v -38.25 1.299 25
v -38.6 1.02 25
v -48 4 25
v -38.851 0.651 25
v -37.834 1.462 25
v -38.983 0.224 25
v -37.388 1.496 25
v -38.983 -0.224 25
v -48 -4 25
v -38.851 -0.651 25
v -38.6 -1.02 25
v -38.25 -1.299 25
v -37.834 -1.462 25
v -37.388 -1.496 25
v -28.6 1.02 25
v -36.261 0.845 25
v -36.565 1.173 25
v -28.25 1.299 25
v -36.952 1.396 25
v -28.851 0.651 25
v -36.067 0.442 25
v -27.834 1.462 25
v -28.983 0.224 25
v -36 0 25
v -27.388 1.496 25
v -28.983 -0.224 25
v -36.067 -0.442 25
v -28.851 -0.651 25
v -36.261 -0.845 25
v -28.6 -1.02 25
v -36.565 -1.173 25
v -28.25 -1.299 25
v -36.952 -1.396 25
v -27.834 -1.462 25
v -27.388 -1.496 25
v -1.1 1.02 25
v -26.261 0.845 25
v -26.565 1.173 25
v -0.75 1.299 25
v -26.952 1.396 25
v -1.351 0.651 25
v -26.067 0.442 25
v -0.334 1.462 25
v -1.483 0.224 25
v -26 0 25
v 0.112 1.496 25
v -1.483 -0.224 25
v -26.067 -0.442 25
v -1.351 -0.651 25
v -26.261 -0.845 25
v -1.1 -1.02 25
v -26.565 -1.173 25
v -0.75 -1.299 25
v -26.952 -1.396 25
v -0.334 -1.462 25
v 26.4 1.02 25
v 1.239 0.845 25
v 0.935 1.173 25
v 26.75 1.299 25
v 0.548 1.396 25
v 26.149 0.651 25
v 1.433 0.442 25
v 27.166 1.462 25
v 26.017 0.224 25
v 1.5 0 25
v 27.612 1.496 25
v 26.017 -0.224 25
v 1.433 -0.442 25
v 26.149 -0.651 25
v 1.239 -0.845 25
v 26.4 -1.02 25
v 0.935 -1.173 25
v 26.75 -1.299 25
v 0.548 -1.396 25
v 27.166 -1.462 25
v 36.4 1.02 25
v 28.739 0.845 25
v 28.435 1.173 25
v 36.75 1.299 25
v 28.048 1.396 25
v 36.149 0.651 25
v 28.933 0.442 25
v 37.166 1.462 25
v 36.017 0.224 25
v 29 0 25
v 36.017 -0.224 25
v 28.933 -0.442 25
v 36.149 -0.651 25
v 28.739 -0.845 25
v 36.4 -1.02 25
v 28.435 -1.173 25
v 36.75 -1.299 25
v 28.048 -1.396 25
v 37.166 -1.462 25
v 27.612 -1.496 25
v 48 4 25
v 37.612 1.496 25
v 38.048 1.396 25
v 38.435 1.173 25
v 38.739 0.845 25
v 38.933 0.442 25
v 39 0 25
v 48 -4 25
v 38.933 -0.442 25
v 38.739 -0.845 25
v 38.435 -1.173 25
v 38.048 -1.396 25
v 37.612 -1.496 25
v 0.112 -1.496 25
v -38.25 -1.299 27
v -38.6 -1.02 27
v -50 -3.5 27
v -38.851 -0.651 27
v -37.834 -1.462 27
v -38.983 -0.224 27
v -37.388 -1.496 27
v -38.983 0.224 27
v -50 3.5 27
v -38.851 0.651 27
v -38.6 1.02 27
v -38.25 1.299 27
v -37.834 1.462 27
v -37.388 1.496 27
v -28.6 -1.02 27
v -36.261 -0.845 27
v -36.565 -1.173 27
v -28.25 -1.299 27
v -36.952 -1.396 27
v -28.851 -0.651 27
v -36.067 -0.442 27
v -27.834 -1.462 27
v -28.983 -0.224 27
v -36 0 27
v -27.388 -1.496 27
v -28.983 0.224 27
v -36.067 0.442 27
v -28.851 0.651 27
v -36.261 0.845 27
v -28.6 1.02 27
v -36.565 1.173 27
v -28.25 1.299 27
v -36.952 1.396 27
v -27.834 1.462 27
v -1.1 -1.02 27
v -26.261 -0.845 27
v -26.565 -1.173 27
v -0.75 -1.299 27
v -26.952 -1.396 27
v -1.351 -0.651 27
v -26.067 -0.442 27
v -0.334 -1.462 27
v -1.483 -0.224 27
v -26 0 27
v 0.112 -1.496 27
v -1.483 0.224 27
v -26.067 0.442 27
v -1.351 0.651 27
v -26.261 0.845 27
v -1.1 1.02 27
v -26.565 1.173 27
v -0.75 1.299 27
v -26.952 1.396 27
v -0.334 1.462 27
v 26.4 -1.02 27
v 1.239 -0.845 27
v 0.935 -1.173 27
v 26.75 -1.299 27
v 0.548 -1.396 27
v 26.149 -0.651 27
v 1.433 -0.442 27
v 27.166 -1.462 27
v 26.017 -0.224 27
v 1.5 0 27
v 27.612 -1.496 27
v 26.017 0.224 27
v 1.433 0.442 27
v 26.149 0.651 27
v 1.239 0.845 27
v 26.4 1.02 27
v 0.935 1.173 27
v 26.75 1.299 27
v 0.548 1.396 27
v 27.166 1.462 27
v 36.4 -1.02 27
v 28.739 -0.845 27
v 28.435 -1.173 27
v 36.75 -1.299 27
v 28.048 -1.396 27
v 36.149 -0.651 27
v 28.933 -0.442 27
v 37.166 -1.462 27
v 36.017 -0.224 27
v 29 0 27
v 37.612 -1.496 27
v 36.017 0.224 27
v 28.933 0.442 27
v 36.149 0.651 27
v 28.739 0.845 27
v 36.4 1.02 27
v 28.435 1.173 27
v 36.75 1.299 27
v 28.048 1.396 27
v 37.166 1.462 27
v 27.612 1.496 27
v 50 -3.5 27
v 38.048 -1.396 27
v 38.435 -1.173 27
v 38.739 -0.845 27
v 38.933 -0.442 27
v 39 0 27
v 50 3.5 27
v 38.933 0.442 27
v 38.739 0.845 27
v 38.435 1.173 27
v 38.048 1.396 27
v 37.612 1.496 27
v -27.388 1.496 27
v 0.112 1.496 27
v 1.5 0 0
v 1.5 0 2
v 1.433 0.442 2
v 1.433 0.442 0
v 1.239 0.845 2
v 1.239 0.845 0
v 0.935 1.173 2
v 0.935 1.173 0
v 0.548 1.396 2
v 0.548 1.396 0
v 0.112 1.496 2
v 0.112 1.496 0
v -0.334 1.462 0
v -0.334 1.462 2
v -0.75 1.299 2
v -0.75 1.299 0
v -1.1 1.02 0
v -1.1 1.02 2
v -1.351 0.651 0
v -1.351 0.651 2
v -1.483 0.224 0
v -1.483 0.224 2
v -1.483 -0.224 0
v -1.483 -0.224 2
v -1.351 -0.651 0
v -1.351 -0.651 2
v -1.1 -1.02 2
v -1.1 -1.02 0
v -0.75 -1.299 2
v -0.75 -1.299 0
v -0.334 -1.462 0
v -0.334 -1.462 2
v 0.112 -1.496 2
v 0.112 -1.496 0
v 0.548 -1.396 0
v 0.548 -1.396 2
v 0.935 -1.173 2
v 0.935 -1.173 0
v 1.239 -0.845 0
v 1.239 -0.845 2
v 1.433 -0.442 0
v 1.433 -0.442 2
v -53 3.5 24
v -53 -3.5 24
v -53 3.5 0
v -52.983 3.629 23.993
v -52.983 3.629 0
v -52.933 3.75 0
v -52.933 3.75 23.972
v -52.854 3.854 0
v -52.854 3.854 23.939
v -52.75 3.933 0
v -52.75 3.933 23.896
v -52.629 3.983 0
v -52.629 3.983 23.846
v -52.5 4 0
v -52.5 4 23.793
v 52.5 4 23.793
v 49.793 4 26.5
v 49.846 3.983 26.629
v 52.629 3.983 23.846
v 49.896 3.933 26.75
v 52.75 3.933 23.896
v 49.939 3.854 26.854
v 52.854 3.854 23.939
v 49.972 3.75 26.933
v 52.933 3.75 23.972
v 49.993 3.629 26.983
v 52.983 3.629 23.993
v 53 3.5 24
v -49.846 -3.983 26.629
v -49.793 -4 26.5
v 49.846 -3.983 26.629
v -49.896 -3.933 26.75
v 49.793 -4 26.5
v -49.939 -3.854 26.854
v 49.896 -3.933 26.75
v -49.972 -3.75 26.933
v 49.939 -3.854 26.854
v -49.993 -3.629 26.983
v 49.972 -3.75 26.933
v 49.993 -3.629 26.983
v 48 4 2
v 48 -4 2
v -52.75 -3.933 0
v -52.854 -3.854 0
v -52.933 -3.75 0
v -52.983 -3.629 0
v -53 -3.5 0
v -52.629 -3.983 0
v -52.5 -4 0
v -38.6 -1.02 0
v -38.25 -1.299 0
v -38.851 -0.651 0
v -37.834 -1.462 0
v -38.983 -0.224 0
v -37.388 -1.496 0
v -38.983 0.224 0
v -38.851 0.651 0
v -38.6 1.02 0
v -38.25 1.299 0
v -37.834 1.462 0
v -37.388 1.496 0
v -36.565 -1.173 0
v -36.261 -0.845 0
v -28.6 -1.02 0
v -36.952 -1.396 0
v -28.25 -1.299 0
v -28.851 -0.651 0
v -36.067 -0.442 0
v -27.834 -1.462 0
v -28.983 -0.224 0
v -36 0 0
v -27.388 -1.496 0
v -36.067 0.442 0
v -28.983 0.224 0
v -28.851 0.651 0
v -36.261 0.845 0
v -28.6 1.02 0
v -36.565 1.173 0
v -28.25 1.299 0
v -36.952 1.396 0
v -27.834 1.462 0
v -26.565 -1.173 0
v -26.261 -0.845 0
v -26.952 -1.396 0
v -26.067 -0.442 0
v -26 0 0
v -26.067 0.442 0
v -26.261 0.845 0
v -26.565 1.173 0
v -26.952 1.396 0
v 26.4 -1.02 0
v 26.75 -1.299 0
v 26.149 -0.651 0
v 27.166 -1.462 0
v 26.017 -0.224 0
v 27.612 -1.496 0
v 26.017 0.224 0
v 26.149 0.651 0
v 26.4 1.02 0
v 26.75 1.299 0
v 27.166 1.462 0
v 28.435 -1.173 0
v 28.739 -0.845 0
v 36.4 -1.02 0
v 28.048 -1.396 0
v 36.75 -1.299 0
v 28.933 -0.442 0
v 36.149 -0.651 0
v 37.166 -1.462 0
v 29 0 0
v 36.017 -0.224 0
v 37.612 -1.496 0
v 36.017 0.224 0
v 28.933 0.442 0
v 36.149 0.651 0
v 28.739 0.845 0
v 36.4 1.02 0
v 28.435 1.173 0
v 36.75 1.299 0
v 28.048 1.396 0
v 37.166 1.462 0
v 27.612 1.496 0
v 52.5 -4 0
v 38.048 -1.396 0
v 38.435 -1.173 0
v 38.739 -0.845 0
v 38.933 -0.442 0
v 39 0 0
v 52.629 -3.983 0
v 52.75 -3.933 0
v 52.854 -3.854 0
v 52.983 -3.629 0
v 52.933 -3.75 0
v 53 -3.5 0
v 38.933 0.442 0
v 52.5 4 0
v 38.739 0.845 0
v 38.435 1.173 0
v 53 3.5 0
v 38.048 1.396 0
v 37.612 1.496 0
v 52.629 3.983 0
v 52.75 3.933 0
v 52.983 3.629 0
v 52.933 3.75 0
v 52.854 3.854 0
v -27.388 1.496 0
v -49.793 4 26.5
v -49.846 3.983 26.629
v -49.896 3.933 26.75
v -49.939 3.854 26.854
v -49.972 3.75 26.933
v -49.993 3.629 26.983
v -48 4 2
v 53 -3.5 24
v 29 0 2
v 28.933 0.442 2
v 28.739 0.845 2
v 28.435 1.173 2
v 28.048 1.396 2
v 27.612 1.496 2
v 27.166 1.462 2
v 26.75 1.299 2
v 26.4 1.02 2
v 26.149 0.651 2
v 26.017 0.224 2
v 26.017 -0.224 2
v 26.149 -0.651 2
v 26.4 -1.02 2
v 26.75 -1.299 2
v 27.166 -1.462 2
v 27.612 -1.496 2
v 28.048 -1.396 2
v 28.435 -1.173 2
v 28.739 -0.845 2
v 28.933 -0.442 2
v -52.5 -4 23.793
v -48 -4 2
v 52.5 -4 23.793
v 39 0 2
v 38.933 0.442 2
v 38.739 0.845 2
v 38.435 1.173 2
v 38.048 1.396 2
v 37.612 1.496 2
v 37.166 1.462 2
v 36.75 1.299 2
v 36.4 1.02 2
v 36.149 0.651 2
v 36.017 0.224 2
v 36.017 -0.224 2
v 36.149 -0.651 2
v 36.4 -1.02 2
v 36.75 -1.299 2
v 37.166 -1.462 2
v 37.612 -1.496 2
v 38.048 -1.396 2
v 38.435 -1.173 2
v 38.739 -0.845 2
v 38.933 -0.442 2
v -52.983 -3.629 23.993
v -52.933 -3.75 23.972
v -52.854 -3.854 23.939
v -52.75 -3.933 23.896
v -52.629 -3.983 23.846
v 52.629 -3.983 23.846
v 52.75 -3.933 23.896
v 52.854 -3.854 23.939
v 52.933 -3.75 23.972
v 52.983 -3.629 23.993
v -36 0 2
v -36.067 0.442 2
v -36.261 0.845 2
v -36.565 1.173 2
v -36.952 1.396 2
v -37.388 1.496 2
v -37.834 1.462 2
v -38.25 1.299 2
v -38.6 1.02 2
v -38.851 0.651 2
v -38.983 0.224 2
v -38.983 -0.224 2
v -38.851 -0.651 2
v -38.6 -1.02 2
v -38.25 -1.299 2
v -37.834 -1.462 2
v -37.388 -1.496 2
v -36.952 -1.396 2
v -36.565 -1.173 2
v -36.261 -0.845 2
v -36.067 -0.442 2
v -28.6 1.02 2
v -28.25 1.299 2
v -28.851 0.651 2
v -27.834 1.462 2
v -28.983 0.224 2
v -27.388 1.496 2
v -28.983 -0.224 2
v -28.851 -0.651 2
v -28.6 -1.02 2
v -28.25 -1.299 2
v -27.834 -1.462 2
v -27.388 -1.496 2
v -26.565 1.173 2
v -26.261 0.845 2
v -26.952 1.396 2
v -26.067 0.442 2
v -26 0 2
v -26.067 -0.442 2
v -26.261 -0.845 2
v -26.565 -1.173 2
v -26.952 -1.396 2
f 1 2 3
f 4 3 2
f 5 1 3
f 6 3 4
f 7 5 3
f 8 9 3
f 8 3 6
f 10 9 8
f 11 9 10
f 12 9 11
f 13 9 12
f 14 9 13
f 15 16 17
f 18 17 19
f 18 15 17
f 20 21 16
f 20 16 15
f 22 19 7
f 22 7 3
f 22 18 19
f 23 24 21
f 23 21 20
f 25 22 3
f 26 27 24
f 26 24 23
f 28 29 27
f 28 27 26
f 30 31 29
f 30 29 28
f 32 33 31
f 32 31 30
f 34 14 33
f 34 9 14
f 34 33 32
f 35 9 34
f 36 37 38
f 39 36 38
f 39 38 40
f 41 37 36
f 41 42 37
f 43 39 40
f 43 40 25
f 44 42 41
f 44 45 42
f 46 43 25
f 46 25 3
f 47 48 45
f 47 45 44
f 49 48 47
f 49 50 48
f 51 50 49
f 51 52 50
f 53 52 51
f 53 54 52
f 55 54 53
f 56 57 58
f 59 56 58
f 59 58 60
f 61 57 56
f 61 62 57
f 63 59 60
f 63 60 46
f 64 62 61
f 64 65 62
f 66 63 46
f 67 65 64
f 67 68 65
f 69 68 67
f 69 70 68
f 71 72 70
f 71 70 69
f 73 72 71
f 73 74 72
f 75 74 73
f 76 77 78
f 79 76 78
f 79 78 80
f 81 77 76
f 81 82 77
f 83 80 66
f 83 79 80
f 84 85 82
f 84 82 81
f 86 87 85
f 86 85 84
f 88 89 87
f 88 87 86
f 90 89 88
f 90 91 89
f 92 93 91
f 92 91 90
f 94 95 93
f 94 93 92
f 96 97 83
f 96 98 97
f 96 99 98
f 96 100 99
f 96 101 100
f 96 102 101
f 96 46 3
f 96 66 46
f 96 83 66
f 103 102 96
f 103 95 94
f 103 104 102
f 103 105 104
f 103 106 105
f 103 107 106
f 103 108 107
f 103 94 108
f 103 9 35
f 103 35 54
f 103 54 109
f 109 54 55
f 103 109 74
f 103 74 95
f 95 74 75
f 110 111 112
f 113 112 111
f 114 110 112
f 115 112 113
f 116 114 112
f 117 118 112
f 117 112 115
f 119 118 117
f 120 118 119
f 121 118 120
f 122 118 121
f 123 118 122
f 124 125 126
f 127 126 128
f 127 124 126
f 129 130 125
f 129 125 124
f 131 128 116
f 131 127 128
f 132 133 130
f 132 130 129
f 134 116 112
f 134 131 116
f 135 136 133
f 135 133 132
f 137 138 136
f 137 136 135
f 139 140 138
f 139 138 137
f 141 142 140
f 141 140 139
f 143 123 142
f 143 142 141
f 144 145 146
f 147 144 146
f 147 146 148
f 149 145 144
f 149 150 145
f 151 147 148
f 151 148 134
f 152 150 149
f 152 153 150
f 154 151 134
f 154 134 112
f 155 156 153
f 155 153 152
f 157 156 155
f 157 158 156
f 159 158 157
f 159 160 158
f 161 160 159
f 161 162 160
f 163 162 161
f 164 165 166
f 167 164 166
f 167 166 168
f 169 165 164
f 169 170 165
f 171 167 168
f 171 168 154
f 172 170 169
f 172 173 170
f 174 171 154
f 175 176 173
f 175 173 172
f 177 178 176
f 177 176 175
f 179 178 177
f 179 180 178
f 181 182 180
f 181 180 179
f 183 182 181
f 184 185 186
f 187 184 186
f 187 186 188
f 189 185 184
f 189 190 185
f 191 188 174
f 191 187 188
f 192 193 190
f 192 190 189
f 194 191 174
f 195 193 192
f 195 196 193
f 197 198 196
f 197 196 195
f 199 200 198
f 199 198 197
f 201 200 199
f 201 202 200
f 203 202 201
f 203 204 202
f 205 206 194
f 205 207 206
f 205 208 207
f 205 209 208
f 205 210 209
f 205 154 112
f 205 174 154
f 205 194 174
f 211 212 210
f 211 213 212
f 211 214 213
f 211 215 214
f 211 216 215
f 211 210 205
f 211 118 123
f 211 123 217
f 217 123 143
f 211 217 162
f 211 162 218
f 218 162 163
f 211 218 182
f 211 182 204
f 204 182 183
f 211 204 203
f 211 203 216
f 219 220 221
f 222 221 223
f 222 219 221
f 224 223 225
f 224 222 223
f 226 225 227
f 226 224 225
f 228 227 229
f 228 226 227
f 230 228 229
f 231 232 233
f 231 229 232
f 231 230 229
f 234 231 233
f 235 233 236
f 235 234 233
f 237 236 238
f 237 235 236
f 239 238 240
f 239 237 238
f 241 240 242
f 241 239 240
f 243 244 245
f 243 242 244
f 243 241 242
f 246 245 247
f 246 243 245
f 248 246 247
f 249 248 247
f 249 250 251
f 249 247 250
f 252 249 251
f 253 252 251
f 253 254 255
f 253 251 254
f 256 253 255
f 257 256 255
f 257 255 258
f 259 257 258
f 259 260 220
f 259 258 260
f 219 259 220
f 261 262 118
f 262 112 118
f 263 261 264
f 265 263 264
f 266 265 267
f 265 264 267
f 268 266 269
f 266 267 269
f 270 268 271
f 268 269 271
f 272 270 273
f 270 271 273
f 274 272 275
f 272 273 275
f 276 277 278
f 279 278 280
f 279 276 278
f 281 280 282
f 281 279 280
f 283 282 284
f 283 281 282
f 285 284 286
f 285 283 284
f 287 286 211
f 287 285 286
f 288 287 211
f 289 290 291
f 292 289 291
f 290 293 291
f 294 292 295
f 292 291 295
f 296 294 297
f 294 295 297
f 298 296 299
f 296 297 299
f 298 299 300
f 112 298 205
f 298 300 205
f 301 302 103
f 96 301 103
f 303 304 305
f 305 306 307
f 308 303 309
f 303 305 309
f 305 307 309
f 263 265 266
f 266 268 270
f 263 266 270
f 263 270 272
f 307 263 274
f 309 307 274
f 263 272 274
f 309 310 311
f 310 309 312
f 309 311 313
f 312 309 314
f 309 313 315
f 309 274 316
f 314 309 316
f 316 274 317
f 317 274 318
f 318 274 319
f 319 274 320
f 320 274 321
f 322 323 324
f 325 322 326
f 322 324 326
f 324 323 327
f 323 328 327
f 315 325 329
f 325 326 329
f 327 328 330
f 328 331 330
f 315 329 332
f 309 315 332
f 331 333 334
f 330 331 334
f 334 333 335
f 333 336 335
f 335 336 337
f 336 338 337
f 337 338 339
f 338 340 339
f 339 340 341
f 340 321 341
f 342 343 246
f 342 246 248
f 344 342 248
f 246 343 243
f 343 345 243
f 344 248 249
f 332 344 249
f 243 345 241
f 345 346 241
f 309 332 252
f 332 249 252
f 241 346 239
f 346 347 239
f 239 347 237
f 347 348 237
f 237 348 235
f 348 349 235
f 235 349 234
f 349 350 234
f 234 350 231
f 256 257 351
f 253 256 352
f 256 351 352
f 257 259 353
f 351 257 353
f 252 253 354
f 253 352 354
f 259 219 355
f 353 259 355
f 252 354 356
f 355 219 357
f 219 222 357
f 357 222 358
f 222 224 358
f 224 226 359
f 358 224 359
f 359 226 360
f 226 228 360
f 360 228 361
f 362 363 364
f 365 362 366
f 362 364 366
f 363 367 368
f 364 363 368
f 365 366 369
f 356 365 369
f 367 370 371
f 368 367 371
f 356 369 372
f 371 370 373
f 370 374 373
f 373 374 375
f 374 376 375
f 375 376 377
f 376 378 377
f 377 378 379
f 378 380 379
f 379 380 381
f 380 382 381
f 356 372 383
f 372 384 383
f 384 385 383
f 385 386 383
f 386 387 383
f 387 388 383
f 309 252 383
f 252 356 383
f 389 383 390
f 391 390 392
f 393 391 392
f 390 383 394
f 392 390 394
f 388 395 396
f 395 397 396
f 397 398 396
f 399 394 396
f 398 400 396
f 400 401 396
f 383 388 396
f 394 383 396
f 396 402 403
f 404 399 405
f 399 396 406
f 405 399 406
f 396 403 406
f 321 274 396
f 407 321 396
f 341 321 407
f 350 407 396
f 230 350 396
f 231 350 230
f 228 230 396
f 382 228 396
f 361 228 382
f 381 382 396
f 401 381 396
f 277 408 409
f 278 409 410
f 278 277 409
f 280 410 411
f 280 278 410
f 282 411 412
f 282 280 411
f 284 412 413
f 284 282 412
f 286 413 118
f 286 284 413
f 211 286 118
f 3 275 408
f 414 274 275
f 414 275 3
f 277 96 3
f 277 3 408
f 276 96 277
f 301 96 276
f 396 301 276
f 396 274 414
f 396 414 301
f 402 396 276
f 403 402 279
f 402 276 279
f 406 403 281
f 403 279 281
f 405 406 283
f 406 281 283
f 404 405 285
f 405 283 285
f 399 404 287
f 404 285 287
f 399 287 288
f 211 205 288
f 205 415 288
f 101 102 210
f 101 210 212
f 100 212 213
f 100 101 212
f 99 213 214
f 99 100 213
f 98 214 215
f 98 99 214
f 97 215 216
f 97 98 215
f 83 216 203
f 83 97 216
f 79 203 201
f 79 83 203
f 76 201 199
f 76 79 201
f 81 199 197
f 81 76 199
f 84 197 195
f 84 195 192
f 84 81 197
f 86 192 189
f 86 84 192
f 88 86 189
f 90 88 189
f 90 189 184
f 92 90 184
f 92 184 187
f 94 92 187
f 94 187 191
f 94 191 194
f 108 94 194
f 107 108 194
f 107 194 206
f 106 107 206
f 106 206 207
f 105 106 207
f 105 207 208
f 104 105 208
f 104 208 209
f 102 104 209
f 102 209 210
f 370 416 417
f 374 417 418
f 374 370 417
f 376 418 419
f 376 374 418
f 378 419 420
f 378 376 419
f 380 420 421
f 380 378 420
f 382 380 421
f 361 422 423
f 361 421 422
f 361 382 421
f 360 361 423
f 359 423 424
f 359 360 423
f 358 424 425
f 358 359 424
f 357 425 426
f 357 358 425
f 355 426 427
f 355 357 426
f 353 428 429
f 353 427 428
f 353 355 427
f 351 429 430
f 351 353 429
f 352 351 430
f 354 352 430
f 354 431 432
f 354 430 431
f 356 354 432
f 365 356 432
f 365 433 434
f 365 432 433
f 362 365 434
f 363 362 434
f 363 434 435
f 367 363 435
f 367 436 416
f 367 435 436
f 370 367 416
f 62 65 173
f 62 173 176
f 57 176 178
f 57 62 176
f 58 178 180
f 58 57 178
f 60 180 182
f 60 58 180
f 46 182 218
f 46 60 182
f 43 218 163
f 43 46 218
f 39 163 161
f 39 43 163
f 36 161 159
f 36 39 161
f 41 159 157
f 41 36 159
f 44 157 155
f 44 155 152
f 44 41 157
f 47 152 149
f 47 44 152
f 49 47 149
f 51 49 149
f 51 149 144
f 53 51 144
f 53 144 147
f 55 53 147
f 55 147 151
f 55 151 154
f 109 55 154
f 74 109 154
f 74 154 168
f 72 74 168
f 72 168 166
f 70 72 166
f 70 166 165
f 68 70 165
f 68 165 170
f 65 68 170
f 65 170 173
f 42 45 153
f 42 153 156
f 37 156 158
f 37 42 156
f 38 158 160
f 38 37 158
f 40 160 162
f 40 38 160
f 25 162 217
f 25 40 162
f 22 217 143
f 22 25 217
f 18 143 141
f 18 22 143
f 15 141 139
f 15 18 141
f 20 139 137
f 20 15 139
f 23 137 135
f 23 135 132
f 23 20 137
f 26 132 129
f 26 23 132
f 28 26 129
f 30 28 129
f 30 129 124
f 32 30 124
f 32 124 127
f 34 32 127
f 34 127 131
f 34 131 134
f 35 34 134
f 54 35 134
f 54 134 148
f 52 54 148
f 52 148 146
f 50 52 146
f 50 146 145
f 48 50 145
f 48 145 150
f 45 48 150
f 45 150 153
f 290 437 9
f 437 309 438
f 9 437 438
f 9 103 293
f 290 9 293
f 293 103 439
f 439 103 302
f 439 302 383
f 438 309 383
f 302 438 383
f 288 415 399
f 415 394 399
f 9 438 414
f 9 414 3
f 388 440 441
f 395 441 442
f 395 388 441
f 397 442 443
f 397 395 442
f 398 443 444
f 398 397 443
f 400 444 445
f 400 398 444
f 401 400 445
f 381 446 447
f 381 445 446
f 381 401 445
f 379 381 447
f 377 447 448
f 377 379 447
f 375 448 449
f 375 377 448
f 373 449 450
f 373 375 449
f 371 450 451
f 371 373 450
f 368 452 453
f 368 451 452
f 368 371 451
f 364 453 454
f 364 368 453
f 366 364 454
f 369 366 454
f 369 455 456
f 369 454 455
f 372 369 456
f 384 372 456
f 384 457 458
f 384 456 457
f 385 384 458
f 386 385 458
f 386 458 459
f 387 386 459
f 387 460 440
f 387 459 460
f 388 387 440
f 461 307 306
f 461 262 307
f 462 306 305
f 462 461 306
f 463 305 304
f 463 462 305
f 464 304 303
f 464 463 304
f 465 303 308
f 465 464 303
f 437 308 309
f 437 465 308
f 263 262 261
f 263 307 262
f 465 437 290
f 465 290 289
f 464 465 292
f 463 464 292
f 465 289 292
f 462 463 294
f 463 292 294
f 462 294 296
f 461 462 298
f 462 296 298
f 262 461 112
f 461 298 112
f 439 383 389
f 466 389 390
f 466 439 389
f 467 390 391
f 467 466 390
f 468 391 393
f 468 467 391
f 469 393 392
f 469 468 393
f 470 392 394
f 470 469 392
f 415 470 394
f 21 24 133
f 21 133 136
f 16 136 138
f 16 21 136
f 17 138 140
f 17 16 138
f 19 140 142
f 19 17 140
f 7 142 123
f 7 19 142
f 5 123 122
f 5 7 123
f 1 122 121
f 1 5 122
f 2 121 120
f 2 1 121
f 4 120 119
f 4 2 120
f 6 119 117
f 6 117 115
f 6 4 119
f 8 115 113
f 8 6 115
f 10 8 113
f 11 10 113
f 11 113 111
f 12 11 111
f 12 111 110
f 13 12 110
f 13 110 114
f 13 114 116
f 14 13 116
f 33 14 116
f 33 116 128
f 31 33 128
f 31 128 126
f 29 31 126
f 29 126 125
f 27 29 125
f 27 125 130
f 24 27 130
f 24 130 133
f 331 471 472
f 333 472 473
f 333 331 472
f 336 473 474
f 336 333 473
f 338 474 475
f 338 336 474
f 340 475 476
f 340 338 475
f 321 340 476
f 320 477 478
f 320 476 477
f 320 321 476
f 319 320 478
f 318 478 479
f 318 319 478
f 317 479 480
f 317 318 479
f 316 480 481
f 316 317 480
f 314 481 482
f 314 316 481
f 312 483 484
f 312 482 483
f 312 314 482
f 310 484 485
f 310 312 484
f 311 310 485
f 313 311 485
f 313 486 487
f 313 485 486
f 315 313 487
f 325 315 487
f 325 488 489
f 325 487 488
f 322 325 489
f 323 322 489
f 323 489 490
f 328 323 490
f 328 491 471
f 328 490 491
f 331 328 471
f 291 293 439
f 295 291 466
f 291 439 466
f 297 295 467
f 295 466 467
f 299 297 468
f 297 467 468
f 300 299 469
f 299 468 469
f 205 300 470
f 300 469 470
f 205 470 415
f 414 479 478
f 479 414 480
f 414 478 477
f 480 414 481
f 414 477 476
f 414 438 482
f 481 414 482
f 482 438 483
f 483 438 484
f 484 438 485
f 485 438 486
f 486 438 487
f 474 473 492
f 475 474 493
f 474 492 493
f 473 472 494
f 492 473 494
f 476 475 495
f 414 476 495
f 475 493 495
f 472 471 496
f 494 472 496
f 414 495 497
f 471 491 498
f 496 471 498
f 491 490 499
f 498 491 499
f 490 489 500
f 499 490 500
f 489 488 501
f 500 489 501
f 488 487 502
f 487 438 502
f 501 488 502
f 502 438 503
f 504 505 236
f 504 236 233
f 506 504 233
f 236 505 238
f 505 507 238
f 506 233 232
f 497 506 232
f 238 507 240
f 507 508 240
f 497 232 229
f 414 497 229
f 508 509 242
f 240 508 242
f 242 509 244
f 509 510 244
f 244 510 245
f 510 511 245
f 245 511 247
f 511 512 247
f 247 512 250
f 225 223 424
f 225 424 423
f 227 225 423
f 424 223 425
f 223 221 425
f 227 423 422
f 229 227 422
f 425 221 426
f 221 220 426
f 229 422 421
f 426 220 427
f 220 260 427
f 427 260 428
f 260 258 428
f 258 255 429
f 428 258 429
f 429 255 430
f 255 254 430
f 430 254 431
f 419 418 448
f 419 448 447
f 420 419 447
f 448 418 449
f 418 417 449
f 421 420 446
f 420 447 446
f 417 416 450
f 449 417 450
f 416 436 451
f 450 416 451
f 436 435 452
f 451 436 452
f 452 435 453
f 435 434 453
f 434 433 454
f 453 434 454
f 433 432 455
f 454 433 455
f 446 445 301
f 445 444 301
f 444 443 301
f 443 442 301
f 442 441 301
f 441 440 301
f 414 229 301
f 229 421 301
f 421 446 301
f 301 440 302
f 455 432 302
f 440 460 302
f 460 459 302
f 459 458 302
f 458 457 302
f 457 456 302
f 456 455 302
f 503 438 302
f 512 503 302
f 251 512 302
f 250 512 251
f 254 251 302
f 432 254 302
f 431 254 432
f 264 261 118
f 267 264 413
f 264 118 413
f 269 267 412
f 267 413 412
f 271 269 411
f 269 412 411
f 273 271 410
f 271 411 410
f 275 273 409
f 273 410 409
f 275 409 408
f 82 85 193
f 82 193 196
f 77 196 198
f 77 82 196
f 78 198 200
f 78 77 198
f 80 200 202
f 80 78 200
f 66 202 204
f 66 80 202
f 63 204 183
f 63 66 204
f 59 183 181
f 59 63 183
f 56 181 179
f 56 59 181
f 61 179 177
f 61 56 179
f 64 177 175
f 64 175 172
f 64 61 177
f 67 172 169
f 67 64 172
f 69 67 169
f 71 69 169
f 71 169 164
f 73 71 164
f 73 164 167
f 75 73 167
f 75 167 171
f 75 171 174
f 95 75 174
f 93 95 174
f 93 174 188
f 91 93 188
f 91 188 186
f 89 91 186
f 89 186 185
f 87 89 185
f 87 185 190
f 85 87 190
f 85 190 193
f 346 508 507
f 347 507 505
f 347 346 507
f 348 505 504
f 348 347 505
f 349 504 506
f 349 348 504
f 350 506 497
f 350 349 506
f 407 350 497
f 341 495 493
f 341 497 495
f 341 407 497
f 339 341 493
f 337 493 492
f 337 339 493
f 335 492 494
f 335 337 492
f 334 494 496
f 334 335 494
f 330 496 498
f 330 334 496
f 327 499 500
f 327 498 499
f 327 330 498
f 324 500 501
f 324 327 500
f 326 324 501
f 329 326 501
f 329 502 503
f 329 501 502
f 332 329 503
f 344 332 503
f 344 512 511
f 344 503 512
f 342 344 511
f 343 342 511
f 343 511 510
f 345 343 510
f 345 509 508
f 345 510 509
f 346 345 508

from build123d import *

# Parameters (mm, degrees)
F1_W     = 106
F1_H     = 8
F1_R     = 1.5
F2_DEPTH = 27
F3_W     = 96
F3_H     = 23
F4_DEPTH = 25
F5_SIZE  = 3
F6_R     = 0.5


with BuildPart() as f2:
    # F1 (on Top) → F2 (new body)
    with BuildSketch(Plane.XY):
        Rectangle(F1_W, F1_H)
        with Locations((-37.5, 0)):
            Circle(F1_R, mode=Mode.SUBTRACT)
        with Locations((-27.5, 0)):
            Circle(F1_R, mode=Mode.SUBTRACT)
        Circle(F1_R, mode=Mode.SUBTRACT)
        with Locations((27.5, 0)):
            Circle(F1_R, mode=Mode.SUBTRACT)
        with Locations((37.5, 0)):
            Circle(F1_R, mode=Mode.SUBTRACT)
    extrude(amount=F2_DEPTH)

    # F3 (on face) → F4 (cut)
    with BuildSketch(Plane.XZ.offset(4)):
        with Locations((0, 13.5)):
            Rectangle(F3_W, F3_H)
    extrude(amount=-F4_DEPTH, mode=Mode.SUBTRACT)

    # F5
    f5_edges = [f2.edges().sort_by_distance(p)[0] for p in [
        (-53, 0, 27),
        (53, 0, 27),
    ]]
    chamfer(f5_edges, length=F5_SIZE)

    # F6
    f6_edges = [f2.edges().sort_by_distance(p)[0] for p in [
        (0, -4, 27),
        (0, 4, 27),
        (51.5, -4, 25.5),
        (53, -4, 12),
        (51.5, 4, 25.5),
        (53, 4, 12),
        (-51.5, -4, 25.5),
        (-51.5, 4, 25.5),
        (-53, -4, 12),
        (-53, 4, 12),
    ]]
    fillet(f6_edges, radius=F6_R)


solid = f2.part
